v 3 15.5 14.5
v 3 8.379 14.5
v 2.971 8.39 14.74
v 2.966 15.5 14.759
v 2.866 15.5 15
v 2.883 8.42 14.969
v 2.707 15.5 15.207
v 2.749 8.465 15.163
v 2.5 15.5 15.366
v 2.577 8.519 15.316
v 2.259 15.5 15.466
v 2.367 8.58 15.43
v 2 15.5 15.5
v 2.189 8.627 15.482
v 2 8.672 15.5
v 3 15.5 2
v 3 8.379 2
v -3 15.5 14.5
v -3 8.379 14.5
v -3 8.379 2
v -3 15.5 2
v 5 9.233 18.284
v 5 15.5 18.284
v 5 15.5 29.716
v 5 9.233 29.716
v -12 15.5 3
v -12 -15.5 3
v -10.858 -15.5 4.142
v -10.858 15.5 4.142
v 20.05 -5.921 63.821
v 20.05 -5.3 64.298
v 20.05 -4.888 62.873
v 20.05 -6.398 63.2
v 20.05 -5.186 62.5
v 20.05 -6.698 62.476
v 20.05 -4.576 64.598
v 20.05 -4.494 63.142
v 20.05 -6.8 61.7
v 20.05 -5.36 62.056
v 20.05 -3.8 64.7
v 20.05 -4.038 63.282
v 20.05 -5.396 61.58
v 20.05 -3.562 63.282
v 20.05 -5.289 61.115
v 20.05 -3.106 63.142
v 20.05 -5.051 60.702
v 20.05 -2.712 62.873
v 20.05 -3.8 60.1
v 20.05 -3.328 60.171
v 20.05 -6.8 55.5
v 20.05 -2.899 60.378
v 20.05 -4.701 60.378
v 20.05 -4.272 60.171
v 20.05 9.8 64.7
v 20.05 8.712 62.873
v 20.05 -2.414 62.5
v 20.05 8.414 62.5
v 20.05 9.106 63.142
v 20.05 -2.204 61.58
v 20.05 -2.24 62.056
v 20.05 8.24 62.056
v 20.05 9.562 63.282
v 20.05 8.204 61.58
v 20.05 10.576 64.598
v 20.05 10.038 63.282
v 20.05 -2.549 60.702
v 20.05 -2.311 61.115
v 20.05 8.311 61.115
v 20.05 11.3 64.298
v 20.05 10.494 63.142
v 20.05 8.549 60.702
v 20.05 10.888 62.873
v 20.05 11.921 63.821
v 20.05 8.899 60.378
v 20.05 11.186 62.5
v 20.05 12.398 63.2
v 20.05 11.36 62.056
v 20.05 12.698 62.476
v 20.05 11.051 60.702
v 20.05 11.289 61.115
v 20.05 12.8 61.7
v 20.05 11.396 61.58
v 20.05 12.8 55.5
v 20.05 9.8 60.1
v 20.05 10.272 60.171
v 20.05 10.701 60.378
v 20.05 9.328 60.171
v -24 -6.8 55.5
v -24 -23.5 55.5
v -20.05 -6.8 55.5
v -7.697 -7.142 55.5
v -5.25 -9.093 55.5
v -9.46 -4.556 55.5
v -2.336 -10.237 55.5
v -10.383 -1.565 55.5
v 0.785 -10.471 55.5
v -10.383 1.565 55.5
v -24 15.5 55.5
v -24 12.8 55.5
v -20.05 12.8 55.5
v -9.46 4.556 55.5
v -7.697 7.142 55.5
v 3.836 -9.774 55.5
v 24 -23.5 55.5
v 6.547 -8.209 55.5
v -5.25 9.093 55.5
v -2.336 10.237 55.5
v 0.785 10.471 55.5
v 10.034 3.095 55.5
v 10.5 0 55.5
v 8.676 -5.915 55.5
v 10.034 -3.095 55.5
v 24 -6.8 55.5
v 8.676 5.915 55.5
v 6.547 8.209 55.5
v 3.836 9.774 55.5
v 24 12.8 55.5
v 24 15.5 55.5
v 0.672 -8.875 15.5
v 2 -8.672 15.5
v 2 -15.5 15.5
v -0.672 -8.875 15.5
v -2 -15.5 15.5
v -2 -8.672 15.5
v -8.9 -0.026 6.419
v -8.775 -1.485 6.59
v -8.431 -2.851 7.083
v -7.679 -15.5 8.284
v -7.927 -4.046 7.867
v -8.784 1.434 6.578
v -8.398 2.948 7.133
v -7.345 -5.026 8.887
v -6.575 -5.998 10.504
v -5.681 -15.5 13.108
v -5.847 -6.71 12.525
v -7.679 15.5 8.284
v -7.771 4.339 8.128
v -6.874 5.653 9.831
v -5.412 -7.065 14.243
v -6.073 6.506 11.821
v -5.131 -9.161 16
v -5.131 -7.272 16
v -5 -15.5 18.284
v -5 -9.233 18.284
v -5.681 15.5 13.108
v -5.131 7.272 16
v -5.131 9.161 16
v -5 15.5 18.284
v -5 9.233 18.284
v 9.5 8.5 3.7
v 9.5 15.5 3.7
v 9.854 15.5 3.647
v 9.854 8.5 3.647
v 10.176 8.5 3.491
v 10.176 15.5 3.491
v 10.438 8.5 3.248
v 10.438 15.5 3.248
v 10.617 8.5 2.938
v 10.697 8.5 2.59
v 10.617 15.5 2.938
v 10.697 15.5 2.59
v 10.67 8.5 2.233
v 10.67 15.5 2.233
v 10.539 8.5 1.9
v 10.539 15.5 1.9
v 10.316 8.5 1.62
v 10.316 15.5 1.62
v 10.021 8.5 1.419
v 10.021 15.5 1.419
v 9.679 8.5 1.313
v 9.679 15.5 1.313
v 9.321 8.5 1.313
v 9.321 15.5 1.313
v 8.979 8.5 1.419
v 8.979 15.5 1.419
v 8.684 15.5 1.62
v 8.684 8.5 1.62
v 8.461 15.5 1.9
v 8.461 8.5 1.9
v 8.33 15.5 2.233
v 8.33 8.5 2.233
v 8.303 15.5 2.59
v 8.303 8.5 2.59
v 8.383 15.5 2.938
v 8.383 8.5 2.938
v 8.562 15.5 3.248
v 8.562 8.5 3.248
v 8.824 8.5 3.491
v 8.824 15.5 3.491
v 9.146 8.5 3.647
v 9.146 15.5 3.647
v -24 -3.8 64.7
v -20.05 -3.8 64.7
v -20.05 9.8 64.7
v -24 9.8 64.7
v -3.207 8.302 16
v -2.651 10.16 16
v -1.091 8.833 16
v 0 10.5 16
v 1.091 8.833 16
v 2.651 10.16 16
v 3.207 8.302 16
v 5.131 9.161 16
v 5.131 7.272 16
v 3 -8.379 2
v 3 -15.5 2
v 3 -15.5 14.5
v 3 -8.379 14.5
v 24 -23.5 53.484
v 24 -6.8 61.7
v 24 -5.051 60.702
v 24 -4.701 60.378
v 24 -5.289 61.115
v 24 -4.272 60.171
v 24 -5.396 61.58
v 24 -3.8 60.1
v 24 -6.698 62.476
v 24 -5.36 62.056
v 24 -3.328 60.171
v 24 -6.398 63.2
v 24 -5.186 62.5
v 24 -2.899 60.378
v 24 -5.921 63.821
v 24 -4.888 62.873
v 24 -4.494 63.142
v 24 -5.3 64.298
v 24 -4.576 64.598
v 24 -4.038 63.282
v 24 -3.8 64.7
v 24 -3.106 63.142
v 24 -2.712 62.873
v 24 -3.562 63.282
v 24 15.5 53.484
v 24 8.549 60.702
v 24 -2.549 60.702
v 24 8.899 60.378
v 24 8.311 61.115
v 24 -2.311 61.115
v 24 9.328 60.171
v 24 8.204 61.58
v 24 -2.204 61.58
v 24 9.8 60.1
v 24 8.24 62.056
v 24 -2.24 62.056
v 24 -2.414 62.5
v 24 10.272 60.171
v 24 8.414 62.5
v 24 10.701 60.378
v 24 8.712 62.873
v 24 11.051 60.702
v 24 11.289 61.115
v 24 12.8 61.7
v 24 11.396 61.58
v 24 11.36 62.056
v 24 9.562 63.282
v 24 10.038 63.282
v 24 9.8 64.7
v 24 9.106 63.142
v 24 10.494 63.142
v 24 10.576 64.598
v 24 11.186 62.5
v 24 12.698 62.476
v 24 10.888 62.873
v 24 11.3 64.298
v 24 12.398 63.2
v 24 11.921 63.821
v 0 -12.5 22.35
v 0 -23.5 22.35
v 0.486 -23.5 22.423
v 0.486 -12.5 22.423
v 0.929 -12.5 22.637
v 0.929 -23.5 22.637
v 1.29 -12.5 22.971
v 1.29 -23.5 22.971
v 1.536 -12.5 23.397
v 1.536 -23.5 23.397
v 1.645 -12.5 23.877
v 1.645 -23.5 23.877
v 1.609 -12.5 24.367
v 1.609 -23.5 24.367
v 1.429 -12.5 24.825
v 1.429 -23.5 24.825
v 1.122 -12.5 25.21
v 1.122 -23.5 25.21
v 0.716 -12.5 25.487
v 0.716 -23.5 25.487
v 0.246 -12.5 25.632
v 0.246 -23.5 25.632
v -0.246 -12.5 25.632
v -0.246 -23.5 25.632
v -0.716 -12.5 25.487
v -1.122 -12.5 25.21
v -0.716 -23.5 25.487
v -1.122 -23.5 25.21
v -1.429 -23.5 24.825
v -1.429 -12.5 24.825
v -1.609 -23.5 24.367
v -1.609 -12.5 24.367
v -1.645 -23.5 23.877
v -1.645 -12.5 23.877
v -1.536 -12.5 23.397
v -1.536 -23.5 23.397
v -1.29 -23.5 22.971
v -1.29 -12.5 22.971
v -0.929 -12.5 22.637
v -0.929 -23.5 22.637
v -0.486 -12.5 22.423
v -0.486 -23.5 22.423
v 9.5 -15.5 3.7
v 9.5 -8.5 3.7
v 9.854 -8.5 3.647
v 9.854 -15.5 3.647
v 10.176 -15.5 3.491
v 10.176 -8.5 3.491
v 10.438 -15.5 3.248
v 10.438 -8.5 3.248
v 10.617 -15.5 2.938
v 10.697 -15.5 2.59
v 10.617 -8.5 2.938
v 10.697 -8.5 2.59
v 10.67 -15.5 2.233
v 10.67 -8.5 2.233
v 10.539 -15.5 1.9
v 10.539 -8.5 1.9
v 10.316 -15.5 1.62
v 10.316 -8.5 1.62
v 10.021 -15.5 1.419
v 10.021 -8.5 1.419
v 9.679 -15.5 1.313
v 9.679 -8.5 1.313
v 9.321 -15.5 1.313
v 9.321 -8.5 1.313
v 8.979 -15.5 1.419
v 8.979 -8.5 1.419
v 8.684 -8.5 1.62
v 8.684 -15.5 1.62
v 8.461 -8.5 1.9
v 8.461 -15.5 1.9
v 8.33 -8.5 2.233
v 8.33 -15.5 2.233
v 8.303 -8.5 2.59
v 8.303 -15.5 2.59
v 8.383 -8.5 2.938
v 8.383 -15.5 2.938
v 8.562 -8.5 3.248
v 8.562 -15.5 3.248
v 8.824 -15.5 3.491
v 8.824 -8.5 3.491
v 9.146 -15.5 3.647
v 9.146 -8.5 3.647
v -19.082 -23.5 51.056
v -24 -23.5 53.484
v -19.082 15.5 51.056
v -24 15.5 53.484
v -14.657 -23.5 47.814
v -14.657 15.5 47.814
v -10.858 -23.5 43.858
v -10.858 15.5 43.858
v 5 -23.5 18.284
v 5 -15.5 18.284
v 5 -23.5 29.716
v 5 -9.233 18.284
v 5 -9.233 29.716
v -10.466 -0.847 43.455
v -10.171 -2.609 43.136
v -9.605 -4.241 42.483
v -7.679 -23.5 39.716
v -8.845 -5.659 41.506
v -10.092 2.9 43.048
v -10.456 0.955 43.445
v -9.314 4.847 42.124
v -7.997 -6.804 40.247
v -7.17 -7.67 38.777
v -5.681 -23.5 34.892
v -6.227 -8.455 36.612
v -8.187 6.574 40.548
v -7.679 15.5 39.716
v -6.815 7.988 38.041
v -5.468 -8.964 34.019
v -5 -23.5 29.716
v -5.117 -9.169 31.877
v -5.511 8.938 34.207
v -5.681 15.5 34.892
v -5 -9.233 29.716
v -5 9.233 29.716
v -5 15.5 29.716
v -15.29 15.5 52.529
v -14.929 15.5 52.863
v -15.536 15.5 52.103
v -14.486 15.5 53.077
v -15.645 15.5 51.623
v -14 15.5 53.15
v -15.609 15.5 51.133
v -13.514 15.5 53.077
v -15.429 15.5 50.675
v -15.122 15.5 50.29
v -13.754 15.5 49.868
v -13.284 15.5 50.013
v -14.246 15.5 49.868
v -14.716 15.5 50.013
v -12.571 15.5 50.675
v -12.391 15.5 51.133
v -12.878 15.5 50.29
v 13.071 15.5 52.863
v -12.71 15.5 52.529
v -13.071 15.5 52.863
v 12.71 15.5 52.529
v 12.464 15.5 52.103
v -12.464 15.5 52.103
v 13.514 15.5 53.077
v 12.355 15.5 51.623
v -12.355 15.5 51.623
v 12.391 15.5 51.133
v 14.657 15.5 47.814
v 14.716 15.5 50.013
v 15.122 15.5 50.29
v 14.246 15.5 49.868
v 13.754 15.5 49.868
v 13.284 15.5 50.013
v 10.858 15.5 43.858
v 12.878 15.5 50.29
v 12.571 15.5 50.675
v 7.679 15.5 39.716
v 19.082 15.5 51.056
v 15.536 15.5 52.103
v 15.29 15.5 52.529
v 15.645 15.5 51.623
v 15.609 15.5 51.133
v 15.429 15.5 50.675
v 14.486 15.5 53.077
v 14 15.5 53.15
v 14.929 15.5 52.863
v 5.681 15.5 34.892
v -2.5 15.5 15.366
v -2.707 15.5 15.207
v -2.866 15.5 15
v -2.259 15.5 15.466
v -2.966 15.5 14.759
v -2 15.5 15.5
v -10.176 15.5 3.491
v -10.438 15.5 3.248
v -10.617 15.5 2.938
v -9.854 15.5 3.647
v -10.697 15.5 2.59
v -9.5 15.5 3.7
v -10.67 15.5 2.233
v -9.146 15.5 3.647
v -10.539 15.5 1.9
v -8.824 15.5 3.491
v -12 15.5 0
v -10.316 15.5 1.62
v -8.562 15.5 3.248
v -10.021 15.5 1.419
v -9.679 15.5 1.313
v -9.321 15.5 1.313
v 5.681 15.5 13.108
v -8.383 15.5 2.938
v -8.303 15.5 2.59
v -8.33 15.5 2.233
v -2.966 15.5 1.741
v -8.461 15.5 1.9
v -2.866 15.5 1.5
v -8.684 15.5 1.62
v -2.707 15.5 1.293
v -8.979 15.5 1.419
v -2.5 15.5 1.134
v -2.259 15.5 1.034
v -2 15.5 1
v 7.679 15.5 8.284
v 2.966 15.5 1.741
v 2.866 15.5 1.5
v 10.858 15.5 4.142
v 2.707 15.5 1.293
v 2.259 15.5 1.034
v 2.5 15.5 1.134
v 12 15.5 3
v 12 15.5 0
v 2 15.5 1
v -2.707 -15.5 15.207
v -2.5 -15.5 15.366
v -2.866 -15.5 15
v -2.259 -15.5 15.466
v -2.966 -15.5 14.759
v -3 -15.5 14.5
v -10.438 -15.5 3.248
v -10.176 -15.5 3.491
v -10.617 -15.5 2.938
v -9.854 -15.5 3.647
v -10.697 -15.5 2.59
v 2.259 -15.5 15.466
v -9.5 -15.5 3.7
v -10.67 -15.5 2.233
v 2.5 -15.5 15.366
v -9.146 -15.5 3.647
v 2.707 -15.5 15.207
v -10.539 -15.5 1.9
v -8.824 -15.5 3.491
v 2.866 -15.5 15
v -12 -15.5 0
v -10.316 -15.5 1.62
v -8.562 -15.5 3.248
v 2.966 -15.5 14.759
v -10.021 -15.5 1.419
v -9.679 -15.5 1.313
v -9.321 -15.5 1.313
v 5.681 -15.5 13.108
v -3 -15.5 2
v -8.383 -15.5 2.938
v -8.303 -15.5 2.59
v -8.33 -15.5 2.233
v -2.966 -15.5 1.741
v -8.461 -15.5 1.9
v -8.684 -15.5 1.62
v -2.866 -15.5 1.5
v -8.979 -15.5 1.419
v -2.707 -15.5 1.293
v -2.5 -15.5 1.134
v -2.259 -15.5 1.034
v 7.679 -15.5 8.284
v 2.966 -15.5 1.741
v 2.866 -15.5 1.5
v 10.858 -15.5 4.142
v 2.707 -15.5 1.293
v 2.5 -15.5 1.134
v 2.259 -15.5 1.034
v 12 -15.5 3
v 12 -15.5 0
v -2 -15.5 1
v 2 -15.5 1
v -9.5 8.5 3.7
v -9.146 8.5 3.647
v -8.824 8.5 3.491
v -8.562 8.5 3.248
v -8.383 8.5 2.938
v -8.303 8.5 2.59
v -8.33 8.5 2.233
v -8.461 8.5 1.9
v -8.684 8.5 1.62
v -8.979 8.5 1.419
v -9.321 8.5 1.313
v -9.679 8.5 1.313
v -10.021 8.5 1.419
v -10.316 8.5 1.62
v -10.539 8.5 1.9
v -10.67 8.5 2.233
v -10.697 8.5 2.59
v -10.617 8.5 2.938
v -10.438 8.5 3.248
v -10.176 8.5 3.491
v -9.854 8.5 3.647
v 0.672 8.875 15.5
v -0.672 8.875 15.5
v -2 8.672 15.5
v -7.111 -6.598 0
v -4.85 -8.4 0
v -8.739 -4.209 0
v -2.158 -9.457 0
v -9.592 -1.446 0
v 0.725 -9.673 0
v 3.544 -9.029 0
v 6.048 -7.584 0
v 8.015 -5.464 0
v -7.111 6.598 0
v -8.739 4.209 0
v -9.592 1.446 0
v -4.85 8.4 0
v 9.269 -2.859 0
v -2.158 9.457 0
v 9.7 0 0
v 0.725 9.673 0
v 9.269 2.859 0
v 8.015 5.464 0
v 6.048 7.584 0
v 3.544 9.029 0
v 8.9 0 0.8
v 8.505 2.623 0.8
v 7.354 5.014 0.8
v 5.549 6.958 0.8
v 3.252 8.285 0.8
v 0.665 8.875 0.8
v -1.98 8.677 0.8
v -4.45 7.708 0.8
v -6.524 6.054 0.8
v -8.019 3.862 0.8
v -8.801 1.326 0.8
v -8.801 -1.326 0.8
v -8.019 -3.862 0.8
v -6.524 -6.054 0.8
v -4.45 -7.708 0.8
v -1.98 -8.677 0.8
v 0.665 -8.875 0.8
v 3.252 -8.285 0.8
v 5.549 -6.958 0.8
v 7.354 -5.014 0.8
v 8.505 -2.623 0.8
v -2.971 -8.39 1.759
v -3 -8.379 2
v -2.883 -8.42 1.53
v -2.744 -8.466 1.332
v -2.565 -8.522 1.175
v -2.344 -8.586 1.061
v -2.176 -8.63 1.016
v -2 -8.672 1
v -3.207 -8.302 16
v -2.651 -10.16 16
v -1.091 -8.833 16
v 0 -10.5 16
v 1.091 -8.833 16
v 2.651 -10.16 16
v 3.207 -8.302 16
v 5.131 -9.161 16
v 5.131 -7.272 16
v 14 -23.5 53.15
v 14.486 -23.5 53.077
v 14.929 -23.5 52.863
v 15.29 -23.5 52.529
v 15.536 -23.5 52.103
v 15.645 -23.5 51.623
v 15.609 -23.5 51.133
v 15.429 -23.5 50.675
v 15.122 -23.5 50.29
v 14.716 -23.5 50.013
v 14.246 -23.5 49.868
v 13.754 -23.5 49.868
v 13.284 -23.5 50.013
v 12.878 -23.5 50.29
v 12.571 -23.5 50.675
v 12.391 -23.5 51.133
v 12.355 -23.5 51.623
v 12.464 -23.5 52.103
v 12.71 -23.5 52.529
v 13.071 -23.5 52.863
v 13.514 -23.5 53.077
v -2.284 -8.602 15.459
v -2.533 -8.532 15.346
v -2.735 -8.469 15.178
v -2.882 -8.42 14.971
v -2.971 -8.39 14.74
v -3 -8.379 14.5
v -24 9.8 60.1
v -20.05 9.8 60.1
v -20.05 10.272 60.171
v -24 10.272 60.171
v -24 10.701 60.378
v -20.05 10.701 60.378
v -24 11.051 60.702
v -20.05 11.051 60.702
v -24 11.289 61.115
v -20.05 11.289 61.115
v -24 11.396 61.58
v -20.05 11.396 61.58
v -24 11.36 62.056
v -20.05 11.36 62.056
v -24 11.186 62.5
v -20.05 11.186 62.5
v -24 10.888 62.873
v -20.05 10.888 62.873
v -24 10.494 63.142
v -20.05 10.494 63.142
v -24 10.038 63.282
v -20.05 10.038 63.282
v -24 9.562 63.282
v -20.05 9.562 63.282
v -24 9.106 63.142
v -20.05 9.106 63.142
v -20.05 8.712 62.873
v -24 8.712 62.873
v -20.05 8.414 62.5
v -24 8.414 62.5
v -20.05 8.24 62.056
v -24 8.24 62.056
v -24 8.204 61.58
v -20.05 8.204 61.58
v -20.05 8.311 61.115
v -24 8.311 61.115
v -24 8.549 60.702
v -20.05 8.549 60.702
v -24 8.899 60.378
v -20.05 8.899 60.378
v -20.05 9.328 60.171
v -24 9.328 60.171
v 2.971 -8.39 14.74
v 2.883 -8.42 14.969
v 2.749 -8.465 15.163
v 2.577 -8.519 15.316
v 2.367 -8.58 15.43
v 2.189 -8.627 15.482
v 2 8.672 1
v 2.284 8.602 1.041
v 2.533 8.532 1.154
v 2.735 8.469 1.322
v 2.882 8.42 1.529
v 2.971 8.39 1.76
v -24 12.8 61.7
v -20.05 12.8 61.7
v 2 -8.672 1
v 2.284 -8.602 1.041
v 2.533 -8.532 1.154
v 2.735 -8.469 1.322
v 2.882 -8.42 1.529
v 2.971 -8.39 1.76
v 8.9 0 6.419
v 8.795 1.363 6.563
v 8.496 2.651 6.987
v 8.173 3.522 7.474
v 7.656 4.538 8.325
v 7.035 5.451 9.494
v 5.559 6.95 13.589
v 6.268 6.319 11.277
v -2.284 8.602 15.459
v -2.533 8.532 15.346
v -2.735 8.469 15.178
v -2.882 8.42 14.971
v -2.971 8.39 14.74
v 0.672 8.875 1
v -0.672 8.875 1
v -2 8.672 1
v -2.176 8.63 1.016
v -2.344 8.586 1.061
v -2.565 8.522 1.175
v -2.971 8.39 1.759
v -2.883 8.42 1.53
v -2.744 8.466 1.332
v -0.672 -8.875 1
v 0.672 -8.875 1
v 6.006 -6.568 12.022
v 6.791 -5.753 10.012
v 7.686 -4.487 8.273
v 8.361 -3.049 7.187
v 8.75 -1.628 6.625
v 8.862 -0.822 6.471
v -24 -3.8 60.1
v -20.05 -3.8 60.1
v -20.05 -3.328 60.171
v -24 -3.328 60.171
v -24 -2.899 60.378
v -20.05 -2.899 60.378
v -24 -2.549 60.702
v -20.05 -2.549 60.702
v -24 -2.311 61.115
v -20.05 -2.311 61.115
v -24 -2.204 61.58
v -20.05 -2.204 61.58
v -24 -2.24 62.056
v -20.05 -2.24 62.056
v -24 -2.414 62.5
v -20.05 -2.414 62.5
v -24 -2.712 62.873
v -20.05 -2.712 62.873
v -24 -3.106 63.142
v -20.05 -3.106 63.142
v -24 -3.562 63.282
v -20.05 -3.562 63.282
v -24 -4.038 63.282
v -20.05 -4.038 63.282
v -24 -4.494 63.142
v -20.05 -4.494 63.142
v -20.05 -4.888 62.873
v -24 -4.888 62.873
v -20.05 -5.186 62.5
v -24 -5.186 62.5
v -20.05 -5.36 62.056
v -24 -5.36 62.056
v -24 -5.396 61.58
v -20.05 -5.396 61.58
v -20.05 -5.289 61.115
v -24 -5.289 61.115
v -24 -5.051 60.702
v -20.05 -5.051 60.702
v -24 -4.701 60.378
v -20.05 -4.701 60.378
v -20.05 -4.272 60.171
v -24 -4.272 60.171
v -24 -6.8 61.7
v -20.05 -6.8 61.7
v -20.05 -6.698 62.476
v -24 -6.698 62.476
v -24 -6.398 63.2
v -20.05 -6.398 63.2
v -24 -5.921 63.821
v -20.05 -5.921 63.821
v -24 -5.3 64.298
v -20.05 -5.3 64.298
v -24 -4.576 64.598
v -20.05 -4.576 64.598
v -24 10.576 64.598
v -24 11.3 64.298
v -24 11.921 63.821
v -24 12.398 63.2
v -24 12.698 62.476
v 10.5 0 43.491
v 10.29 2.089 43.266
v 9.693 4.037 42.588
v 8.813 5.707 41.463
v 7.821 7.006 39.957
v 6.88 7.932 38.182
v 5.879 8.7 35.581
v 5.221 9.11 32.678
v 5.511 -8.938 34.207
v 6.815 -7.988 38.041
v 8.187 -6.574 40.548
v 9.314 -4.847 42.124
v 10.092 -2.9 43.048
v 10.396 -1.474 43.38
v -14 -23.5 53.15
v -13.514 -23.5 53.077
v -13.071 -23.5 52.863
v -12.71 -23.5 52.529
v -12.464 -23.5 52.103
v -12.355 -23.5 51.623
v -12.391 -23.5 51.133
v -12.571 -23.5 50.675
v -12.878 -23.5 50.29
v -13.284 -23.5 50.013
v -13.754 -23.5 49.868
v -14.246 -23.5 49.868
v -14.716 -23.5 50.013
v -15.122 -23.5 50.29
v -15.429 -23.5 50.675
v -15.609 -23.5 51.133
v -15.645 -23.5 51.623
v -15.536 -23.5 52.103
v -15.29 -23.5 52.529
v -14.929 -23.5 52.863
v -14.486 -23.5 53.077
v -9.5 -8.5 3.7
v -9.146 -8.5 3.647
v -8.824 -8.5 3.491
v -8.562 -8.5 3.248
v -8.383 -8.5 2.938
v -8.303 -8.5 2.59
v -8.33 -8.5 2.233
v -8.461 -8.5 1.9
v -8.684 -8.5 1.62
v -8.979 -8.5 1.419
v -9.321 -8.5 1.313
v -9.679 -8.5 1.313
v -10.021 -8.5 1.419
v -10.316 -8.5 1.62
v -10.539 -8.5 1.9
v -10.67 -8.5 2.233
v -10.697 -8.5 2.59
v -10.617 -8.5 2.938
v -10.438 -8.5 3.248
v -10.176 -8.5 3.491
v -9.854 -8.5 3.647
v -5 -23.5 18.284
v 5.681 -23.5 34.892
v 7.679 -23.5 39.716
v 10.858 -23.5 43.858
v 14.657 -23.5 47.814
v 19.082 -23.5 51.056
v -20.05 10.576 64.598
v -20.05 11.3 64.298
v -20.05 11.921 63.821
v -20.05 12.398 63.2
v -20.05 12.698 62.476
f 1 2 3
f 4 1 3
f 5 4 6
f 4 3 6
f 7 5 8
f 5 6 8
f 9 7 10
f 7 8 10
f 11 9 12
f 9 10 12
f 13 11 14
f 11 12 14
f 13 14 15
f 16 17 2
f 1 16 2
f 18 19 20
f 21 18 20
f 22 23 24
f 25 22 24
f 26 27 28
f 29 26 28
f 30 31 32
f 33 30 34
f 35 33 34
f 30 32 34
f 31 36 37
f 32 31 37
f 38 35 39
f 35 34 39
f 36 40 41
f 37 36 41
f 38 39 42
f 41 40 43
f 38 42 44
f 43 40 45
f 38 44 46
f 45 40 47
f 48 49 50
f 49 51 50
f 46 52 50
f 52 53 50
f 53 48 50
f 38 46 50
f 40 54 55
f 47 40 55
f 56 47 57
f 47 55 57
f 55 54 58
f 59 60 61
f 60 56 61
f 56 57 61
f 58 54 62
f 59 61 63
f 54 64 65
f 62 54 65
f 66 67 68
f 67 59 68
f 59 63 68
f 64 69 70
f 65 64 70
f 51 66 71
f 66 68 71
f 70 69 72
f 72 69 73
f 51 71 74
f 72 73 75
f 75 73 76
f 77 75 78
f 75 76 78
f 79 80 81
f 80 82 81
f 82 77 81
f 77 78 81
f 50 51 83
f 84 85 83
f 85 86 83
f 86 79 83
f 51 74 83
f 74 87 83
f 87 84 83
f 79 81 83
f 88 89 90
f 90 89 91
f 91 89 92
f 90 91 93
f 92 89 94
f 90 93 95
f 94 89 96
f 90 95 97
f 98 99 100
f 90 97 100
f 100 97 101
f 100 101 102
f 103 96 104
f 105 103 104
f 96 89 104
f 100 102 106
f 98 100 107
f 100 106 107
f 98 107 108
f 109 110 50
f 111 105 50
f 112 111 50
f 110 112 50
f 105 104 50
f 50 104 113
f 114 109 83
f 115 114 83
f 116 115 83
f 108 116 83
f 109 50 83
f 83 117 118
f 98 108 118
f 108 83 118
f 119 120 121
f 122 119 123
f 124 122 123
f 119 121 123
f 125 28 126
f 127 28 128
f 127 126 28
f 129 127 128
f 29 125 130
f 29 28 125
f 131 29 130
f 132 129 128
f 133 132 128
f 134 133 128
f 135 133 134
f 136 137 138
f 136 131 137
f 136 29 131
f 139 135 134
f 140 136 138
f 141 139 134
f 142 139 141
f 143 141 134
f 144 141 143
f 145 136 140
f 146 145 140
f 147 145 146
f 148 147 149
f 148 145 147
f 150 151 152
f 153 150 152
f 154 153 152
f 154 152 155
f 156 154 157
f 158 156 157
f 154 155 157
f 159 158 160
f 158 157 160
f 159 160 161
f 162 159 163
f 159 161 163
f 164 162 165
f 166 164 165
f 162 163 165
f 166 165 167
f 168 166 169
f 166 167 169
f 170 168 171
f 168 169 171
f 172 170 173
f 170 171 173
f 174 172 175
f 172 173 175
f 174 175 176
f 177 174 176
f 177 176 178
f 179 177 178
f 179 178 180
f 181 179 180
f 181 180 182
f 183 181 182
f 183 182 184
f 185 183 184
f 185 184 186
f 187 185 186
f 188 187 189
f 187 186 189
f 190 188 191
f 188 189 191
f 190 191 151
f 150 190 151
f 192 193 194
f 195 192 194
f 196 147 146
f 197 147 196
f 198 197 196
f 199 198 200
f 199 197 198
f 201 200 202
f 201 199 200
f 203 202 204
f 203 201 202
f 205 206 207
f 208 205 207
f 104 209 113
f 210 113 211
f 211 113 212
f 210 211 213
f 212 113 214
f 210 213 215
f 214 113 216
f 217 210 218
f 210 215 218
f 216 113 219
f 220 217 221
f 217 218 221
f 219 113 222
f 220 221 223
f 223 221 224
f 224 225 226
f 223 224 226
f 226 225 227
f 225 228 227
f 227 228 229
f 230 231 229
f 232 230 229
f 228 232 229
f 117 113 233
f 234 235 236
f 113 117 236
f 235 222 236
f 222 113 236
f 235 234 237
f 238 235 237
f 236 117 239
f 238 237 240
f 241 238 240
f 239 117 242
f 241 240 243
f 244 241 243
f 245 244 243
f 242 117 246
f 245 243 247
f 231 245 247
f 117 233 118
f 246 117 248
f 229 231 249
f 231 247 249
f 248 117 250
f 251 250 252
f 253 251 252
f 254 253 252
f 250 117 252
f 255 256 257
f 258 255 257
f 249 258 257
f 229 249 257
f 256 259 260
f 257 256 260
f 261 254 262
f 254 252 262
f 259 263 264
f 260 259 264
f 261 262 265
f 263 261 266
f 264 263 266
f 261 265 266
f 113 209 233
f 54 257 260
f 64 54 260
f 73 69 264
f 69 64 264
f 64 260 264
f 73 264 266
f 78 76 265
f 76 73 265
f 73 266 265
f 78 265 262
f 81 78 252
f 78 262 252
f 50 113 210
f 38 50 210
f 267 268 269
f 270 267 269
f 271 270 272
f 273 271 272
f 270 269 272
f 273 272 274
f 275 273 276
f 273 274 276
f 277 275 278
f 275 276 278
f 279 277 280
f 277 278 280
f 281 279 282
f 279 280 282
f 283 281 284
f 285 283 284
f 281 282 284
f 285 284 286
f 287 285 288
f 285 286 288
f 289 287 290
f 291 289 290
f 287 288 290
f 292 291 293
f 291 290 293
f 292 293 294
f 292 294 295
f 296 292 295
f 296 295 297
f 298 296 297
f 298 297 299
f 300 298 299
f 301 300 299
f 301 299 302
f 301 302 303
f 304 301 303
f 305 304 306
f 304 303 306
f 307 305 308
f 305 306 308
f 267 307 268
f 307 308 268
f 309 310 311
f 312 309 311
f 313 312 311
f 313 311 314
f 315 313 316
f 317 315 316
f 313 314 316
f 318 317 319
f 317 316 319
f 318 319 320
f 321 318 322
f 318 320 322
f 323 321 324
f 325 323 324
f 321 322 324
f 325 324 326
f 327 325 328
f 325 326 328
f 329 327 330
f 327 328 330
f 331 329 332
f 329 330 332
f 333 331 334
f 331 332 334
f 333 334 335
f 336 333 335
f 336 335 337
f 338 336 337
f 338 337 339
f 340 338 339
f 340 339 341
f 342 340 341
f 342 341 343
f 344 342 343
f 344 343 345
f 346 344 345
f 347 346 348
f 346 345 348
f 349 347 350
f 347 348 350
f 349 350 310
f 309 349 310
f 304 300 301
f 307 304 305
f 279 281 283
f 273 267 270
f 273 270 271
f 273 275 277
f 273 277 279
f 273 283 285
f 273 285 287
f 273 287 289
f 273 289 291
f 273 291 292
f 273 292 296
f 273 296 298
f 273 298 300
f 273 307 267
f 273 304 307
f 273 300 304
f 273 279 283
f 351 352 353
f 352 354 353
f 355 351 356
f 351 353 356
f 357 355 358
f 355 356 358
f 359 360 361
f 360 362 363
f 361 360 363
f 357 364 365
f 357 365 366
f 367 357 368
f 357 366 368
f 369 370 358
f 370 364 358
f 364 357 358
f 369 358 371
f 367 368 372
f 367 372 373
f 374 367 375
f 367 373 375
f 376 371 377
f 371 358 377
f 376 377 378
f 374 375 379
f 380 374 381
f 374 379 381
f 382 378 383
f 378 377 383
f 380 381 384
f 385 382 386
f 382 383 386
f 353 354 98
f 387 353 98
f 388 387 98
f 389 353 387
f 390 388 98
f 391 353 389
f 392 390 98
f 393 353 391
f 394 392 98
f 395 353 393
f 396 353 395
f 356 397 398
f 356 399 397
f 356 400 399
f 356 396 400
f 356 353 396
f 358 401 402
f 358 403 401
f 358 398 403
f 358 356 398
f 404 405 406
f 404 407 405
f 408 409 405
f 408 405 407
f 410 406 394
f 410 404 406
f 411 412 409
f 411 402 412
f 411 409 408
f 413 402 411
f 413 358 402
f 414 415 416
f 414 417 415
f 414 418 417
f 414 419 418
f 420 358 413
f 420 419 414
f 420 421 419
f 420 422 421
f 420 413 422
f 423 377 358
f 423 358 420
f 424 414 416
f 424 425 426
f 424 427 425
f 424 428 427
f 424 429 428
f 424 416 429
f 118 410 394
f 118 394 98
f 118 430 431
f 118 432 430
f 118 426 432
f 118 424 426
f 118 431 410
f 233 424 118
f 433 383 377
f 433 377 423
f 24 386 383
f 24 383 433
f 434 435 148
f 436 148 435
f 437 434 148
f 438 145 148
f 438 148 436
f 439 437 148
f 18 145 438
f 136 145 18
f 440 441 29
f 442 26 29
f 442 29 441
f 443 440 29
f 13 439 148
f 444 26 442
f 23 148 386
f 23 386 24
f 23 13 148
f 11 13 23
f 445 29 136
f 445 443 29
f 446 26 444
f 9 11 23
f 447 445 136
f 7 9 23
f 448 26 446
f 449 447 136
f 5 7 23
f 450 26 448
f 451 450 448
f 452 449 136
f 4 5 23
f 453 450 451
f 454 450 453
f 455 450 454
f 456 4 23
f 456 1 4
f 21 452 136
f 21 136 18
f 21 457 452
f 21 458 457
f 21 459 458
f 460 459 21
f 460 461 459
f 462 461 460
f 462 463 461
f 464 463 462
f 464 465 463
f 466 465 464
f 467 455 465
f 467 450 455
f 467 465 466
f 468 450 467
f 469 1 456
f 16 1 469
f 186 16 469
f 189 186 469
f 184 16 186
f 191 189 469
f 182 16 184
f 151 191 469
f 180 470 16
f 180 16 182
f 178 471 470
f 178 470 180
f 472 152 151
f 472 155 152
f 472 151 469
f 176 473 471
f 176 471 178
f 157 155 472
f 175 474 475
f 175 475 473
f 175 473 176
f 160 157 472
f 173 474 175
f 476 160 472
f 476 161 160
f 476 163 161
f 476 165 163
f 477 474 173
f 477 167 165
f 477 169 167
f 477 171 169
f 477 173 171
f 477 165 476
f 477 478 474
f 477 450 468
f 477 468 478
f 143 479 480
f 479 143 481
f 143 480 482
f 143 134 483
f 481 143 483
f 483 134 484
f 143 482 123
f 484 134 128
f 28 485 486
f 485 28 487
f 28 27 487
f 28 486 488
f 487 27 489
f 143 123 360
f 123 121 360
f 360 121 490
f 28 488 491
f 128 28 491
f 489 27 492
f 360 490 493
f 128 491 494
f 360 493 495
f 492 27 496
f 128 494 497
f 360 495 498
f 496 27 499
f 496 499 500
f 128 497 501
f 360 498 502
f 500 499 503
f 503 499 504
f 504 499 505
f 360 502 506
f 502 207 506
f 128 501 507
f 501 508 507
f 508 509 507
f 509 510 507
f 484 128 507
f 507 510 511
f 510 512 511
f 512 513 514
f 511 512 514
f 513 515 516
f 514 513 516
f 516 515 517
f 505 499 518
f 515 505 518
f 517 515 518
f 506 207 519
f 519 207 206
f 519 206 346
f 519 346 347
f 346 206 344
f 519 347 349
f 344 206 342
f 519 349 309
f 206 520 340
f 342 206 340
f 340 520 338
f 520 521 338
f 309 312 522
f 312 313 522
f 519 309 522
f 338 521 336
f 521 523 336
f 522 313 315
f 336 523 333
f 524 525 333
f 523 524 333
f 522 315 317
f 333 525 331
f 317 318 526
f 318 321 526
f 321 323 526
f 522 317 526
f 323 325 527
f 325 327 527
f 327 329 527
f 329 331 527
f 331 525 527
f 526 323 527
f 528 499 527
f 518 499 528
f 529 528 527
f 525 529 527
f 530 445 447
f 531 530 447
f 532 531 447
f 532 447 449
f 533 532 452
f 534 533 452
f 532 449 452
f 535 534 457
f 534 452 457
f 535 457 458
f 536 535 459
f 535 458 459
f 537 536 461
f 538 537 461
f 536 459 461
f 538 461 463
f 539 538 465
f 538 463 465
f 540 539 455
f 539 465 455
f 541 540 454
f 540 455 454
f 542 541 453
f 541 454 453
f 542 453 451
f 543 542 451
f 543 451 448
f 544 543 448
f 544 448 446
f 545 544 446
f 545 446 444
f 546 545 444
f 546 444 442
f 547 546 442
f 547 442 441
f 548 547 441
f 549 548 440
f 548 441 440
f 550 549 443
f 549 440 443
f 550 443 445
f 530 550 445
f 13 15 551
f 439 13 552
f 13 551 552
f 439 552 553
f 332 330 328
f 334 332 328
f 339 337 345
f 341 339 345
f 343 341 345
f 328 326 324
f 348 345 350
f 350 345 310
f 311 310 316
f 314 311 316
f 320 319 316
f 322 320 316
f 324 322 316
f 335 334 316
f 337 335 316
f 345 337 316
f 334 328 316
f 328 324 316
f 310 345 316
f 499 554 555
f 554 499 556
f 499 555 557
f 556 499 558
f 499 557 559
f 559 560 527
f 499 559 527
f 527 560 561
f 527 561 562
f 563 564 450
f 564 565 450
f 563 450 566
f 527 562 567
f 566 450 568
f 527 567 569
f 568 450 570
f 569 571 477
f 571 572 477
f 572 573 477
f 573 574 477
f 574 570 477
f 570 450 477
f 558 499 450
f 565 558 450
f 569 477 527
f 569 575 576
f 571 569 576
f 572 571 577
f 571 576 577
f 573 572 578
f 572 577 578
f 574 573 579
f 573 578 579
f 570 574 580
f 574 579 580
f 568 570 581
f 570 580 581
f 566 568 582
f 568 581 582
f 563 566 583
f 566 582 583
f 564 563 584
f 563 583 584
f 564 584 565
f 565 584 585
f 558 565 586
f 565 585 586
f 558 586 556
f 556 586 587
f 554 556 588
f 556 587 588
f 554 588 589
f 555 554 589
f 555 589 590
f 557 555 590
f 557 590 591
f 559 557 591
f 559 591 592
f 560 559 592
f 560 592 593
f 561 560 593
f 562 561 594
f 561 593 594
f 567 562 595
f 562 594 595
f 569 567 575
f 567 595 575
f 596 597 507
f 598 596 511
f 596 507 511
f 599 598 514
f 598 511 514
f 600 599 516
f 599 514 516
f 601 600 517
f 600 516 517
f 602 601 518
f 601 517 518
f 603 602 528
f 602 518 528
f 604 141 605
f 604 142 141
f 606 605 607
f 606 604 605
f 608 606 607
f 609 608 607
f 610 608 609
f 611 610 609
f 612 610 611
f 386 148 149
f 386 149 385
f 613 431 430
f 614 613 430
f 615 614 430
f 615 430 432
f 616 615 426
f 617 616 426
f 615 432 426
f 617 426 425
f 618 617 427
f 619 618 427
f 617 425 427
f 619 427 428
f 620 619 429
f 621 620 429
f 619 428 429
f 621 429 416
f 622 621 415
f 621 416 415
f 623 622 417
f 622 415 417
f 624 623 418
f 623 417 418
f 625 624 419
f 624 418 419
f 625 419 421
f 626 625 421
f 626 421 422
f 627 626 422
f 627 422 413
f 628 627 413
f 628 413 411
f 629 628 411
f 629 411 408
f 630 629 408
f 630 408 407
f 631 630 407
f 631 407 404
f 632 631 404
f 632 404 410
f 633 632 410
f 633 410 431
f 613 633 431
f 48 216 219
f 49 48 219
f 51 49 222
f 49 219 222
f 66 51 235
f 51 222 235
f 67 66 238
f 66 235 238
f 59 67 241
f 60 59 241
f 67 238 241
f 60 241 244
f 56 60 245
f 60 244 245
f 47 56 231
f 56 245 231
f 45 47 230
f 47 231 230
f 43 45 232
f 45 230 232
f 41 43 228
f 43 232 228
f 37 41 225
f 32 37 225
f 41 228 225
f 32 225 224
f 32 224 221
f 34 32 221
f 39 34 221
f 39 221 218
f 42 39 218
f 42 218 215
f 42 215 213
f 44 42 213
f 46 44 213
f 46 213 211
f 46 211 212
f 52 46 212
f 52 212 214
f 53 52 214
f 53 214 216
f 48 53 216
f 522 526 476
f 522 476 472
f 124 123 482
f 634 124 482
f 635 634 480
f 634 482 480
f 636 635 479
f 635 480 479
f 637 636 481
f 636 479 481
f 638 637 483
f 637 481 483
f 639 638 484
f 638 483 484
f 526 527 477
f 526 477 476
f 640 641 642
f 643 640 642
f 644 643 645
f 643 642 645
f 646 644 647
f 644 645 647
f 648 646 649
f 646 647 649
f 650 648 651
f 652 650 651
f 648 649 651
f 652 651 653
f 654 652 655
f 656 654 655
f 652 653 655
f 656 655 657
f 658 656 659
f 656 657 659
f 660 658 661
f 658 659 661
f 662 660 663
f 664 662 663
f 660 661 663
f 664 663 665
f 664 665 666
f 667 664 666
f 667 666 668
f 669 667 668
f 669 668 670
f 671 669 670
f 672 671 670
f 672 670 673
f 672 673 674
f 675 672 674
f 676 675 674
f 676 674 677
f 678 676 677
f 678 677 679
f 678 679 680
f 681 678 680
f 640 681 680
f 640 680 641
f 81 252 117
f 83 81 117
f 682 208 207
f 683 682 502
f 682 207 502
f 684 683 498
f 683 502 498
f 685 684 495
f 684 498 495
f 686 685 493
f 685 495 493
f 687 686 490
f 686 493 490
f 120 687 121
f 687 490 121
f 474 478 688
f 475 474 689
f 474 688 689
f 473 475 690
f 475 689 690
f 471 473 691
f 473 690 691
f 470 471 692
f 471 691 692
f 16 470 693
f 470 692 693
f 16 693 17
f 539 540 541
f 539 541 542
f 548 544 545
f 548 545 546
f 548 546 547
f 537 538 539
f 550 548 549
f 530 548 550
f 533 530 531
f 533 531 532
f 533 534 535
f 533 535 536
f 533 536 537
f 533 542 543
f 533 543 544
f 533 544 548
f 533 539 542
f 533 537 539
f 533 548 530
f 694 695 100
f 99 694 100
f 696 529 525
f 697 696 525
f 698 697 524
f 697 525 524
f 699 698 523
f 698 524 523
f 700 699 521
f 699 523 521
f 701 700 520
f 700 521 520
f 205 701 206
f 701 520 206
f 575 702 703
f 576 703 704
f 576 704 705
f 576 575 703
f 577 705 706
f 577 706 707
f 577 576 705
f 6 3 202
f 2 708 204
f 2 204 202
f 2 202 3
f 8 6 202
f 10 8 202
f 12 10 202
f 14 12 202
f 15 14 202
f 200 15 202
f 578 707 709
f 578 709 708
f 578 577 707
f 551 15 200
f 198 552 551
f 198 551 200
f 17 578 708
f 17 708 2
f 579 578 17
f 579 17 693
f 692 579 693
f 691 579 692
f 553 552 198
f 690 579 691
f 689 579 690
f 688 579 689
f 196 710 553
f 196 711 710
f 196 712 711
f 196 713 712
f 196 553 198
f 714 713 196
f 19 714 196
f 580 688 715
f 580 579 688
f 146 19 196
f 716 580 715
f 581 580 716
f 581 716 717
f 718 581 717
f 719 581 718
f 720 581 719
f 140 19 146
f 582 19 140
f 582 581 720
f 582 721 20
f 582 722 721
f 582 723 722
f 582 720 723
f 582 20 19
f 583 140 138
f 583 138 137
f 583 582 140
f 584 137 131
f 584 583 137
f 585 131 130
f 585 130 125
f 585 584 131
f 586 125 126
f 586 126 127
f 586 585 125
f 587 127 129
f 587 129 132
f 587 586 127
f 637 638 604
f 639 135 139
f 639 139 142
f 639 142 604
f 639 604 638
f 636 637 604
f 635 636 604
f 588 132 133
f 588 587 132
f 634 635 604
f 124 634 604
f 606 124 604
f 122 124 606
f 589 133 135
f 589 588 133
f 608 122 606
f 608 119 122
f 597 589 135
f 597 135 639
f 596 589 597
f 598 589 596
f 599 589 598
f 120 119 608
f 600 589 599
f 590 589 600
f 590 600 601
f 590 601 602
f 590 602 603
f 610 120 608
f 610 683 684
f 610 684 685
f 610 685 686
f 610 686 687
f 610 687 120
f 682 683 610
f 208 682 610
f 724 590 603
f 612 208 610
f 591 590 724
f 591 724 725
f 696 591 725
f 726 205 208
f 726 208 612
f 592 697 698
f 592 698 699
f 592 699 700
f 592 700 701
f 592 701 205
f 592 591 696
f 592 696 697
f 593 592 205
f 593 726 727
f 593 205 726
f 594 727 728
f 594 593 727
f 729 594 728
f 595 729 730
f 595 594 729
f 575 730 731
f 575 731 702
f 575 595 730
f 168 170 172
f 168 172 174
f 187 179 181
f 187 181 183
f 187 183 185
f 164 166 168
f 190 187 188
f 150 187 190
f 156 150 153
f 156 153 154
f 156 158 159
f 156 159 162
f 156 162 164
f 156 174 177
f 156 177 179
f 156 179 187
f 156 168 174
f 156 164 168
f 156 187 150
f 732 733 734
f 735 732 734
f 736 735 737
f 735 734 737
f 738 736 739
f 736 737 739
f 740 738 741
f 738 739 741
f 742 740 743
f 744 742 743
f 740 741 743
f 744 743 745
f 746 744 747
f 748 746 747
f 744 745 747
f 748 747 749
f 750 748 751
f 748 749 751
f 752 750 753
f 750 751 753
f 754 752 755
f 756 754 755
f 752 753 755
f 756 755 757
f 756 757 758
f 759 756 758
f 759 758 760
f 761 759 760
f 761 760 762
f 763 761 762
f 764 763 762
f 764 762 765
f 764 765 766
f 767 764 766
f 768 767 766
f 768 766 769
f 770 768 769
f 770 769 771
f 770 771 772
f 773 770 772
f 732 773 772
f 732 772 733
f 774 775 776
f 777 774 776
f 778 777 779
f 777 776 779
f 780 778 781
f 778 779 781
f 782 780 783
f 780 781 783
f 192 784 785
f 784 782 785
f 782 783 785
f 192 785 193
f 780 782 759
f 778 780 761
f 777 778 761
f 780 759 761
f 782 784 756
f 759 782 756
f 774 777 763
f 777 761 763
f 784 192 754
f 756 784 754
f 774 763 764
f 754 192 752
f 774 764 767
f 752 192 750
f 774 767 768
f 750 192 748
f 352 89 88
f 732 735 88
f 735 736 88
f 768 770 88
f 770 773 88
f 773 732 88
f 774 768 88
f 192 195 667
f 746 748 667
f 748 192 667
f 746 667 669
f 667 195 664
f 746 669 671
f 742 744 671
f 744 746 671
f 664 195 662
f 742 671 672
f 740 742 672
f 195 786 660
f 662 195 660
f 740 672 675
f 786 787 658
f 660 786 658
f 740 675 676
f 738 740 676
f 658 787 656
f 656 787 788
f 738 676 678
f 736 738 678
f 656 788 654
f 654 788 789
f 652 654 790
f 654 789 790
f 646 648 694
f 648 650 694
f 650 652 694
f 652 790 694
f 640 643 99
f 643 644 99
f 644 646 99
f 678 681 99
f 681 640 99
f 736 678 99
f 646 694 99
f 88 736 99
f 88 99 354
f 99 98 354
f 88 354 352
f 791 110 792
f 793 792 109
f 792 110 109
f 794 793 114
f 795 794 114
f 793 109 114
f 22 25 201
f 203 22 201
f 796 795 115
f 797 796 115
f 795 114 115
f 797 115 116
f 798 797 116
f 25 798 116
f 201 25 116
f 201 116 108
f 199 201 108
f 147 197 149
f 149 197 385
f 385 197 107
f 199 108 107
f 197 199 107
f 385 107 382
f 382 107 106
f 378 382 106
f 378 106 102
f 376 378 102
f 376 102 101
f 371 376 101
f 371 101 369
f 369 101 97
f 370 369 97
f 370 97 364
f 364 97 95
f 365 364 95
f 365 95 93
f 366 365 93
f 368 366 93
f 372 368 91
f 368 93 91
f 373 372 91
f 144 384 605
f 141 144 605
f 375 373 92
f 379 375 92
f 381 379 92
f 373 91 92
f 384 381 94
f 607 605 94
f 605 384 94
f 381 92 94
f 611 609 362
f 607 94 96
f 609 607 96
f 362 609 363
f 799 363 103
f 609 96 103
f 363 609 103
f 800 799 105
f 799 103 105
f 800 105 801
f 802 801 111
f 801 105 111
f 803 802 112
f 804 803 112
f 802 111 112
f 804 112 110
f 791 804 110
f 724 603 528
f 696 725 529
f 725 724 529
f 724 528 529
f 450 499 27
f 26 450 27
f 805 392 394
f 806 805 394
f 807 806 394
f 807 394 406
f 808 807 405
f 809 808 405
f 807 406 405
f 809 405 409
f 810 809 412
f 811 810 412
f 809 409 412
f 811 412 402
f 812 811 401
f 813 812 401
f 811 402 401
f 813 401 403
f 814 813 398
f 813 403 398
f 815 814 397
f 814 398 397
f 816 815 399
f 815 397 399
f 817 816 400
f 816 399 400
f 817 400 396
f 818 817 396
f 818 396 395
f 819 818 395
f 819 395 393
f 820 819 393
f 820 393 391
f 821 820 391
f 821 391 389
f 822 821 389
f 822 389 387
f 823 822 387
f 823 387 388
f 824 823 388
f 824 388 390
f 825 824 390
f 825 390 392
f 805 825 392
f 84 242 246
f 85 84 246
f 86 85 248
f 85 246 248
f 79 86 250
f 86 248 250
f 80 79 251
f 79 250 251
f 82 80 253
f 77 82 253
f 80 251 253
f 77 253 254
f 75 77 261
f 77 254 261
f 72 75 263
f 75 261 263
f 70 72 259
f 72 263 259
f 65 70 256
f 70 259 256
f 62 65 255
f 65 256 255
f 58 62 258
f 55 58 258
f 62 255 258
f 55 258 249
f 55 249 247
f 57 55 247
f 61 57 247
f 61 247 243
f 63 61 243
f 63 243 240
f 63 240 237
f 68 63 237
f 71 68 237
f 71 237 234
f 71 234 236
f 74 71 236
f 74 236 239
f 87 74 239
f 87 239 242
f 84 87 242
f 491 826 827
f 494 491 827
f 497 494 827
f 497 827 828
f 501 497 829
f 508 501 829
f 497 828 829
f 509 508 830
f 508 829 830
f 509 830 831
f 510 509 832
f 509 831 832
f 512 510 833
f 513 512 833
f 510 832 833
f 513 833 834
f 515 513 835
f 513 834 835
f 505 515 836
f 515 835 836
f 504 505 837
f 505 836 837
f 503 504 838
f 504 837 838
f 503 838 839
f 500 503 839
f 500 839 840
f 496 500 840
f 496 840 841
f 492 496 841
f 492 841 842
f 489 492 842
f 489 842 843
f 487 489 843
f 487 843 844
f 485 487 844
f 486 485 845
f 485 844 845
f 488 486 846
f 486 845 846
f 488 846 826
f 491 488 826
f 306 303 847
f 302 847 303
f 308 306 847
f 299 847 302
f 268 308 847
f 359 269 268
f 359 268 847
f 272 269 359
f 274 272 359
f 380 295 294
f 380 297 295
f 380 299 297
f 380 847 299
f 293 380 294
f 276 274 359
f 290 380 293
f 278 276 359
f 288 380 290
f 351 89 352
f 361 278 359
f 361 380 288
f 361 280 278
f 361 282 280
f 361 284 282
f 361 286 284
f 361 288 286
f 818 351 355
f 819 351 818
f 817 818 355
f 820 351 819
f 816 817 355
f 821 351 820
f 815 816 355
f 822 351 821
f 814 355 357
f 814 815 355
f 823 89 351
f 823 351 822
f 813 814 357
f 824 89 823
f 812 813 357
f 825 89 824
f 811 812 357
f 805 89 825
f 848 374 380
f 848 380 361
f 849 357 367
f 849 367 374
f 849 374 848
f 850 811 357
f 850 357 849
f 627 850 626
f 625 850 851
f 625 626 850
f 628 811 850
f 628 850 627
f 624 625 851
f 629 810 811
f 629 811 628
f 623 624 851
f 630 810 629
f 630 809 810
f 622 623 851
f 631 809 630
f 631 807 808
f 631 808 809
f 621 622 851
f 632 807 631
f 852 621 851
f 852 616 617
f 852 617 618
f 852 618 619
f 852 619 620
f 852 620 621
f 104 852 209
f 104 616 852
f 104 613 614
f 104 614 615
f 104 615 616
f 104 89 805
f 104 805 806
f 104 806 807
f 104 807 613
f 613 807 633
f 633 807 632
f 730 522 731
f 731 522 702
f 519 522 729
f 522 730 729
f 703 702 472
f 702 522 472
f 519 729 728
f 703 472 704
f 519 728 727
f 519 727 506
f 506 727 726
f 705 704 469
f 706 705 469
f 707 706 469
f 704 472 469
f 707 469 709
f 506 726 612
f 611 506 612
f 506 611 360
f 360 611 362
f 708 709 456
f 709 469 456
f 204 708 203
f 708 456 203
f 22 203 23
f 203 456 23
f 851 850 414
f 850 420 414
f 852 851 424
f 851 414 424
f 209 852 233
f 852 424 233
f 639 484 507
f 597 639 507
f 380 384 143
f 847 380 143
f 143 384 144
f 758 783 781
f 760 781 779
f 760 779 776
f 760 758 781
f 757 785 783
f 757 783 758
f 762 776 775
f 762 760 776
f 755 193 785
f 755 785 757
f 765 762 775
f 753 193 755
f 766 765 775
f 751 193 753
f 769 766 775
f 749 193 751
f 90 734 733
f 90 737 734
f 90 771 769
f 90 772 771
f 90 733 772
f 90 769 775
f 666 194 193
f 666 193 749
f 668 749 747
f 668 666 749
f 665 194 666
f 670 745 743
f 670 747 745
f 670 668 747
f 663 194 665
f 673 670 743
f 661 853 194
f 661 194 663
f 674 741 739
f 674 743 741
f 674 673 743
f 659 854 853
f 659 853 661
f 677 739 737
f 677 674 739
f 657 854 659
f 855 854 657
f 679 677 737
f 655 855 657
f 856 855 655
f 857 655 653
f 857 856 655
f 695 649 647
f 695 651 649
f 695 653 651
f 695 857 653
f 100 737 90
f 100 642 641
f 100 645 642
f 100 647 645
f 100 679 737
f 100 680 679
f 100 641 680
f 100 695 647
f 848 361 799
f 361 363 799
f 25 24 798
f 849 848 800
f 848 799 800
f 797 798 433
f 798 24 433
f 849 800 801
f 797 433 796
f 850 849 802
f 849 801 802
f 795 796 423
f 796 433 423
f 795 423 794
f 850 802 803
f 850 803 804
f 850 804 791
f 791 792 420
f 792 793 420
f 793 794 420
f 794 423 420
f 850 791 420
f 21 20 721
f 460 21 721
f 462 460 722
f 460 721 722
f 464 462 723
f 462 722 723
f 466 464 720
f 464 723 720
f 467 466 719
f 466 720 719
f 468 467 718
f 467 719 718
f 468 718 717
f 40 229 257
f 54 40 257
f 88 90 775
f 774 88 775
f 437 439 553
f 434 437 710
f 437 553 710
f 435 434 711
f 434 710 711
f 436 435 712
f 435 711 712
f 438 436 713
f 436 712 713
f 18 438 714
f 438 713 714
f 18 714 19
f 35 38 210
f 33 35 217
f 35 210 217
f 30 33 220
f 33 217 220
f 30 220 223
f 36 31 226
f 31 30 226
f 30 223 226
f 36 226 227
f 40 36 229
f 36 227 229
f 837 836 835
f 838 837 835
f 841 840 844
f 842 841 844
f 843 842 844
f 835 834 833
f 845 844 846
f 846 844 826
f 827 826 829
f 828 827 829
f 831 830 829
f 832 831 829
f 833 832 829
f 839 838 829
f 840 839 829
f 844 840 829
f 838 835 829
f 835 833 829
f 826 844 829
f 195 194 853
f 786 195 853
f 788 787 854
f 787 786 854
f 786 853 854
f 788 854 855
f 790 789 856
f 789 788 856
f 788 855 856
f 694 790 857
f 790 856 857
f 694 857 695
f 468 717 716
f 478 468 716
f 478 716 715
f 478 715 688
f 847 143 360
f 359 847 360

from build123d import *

# Parameters (mm, degrees)
SKETCH_1_W           = 48
SKETCH_1_H           = 31
SKETCH_1_R           = 8.9
EXTRUDE_1_DEPTH      = 65
SKETCH_2_R           = 10.5
CUT_EXTRUDE_1_DEPTH  = 49
CUT_EXTRUDE_3_DEPTH  = 76.907838857
CUT_EXTRUDE_START    = -31
CUT_EXTRUDE_5_DEPTH  = 107.907838984
SKETCH_9_R           = 1.2
CUT_EXTRUDE_6_DEPTH  = 7
CUT_EXTRUDE_START_2  = -24
SKETCH_9_2_R         = 1.2
CUT_EXTRUDE_7_DEPTH  = 7
EXTRUDE_4_DEPTH      = 8
SKETCH_11_R          = 1.65
CUT_EXTRUDE_9_DEPTH  = 80.511005658
SKETCH_14_R          = 1.65
CUT_EXTRUDE_10_DEPTH = 11
SKETCH_15_W          = 40.1
SKETCH_15_H          = 9.5
CUT_EXTRUDE_11_DEPTH = 80.511005658
SKETCH_17_R          = 1.6
CUT_EXTRUDE_13_DEPTH = 85.150163426
SKETCH_19_W          = 3
SKETCH_19_H          = 3
CUT_EXTRUDE_14_DEPTH = 76.651107105
CHAMFER_1_SIZE       = 0.8


with BuildPart() as part:
    # 草图1 → 凸台-拉伸1 (new body)
    with BuildSketch(Plane.XY):
        Rectangle(SKETCH_1_W, SKETCH_1_H)
        Circle(SKETCH_1_R, mode=Mode.SUBTRACT)
    extrude(amount=EXTRUDE_1_DEPTH)

    # 草图2 → 切除-拉伸1 (cut)
    with BuildSketch(Plane.XY.offset(65)):
        Circle(SKETCH_2_R)
    extrude(amount=-CUT_EXTRUDE_1_DEPTH, mode=Mode.SUBTRACT)

    # 草图4 → 切除-拉伸3 (cut, through all)
    with BuildSketch(Plane(origin=(0, 15.5, 0), x_dir=(1, 0, 0), z_dir=(0, 1, 0))):
        with BuildLine():
            Line((-24, 9), (-10.857864376, -4.142135624))
            ThreePointArc((-10.857864376, -4.142135624), (-6.52240935, -10.6306026), (-5, -18.284271247))
            Line((-5, -18.284271247), (-5, -29.715728753))
            ThreePointArc((-5, -29.715728753), (-6.52240935, -37.3693974), (-10.857864376, -43.857864376))
            ThreePointArc((-10.857864376, -43.857864376), (-16.798925034, -49.531146093), (-24, -53.484226727))
            Line((-24, -53.484226727), (-24, 9))
        make_face()
        with BuildLine():
            Line((5, -18.284271247), (5, -29.715728753))
            ThreePointArc((5, -29.715728753), (6.52240935, -37.3693974), (10.857864376, -43.857864376))
            ThreePointArc((10.857864376, -43.857864376), (16.798925034, -49.531146093), (24, -53.484226727))
            Line((24, -53.484226727), (24, 9))
            Line((24, 9), (10.857864376, -4.142135624))
            ThreePointArc((10.857864376, -4.142135624), (6.52240935, -10.6306026), (5, -18.284271247))
        make_face()
    extrude(amount=-CUT_EXTRUDE_3_DEPTH, mode=Mode.SUBTRACT)

    # 草图6 → 切除-拉伸5 (cut, through all)
    with BuildSketch(Plane(origin=(0, 15.5, 0), x_dir=(1, 0, 0), z_dir=(0, 1, 0)).offset(CUT_EXTRUDE_START)):
        with BuildLine():
            Line((-2, -1), (2, -1))
            ThreePointArc((2, -1), (2.707106781, -1.292893219), (3, -2))
            Line((3, -2), (3, -14.5))
            ThreePointArc((3, -14.5), (2.707106781, -15.207106781), (2, -15.5))
            Line((2, -15.5), (-2, -15.5))
            ThreePointArc((-2, -15.5), (-2.707106781, -15.207106781), (-3, -14.5))
            Line((-3, -14.5), (-3, -2))
            ThreePointArc((-3, -2), (-2.707106781, -1.292893219), (-2, -1))
        make_face()
    extrude(amount=CUT_EXTRUDE_5_DEPTH, mode=Mode.SUBTRACT)

    # 草图9 → 切除-拉伸6 (cut)
    with BuildSketch(Plane(origin=(0, 15.5, 0), x_dir=(1, 0, 0), z_dir=(0, 1, 0))):
        with Locations(Location((9.5, -2.5, 0), (0, 0, 270))):
            Circle(SKETCH_9_R)
        with Locations(Location((-9.5, -2.5, 0), (0, 0, 270))):
            Circle(SKETCH_9_R)
    extrude(amount=-CUT_EXTRUDE_6_DEPTH, mode=Mode.SUBTRACT)

    # 草图9<2> → 切除-拉伸7 (cut)
    with BuildSketch(Plane(origin=(0, 15.5, 0), x_dir=(1, 0, 0), z_dir=(0, 1, 0)).offset(CUT_EXTRUDE_START_2)):
        with Locations(Location((9.5, -2.5, 0), (0, 0, 270))):
            Circle(SKETCH_9_2_R)
        with Locations(Location((-9.5, -2.5, 0), (0, 0, 270))):
            Circle(SKETCH_9_2_R)
    extrude(amount=-CUT_EXTRUDE_7_DEPTH, mode=Mode.SUBTRACT)

    # 草图12 → 凸台-拉伸4 (add)
    with BuildSketch(Plane.XZ.offset(15.5)):
        with BuildLine():
            Line((-5, 18.284271247), (5, 18.284271247))
            Line((5, 18.284271247), (5, 29.715728753))
            ThreePointArc((5, 29.715728753), (6.52240935, 37.3693974), (10.857864376, 43.857864376))
            ThreePointArc((10.857864376, 43.857864376), (16.798925034, 49.531146093), (24, 53.484226727))
            Line((24, 53.484226727), (24, 65))
            Line((24, 65), (-24, 65))
            Line((-24, 65), (-24, 53.484226727))
            ThreePointArc((-24, 53.484226727), (-16.798925034, 49.531146093), (-10.857864376, 43.857864376))
            ThreePointArc((-10.857864376, 43.857864376), (-6.52240935, 37.3693974), (-5, 29.715728753))
            Line((-5, 29.715728753), (-5, 18.284271247))
        make_face()
    extrude(amount=EXTRUDE_4_DEPTH)

    # 草图11 → 切除-拉伸9 (cut, through all)
    with BuildSketch(Plane(origin=(0, 15.5, 0), x_dir=(1, 0, 0), z_dir=(0, 1, 0))):
        with Locations(Location((14, -51.5, 0), (0, 0, 270))):
            Circle(SKETCH_11_R)
        with Locations(Location((-14, -51.5, 0), (0, 0, 270))):
            Circle(SKETCH_11_R)
    extrude(amount=-CUT_EXTRUDE_9_DEPTH, mode=Mode.SUBTRACT)

    # 草图14 → 切除-拉伸10 (cut)
    with BuildSketch(Plane.XZ.offset(23.5)):
        with Locations(Location((0, 24, 0), (0, 0, 270))):
            Circle(SKETCH_14_R)
    extrude(amount=-CUT_EXTRUDE_10_DEPTH, mode=Mode.SUBTRACT)

    # 草图15 → 切除-拉伸11 (cut, through all)
    with BuildSketch(Plane(origin=(0, 15.5, 0), x_dir=(1, 0, 0), z_dir=(0, 1, 0))):
        with Locations((0, -60.25)):
            Rectangle(SKETCH_15_W, SKETCH_15_H)
    extrude(amount=-CUT_EXTRUDE_11_DEPTH, mode=Mode.SUBTRACT)

    # 草图17 → 切除-拉伸13 (cut, through all)
    with BuildSketch(Plane(origin=(24, 0, 0), x_dir=(0, 0, -1), z_dir=(1, 0, 0))):
        with Locations((-61.7, 9.8)):
            Circle(SKETCH_17_R)
        with Locations((-61.7, -3.8)):
            Circle(SKETCH_17_R)
        with BuildLine():
            Line((-55.5, -23.5), (-55.5, -6.8))
            Line((-55.5, -6.8), (-61.7, -6.8))
            ThreePointArc((-61.7, -6.8), (-63.821320344, -5.921320344), (-64.7, -3.8))
            Line((-64.7, -3.8), (-64.7, 9.8))
            ThreePointArc((-64.7, 9.8), (-63.821320344, 11.921320344), (-61.7, 12.8))
            Line((-61.7, 12.8), (-55.5, 12.8))
            Line((-55.5, 12.8), (-55.5, 15.5))
            Line((-55.5, 15.5), (-64.7, 15.5))
            Line((-64.7, 15.5), (-94.5, 15.5))
            Line((-94.5, 15.5), (-94.5, -23.5))
            Line((-94.5, -23.5), (-55.5, -23.5))
        make_face()
    extrude(amount=-CUT_EXTRUDE_13_DEPTH, mode=Mode.SUBTRACT)

    # 草图19 → 切除-拉伸14 (cut, through all)
    with BuildSketch(Plane.XZ.offset(15.5)):
        with Locations((-13.5, 1.5)):
            Rectangle(SKETCH_19_W, SKETCH_19_H)
        with Locations((13.5, 1.5)):
            Rectangle(SKETCH_19_W, SKETCH_19_H)
    extrude(amount=-CUT_EXTRUDE_14_DEPTH, mode=Mode.SUBTRACT)

    # 倒角1
    chamfer_1_edges = [part.edges().sort_by_distance(p)[0] for p in [
        (-8.9, 0, 0),
    ]]
    chamfer(chamfer_1_edges, length=CHAMFER_1_SIZE)


solid = part.part
